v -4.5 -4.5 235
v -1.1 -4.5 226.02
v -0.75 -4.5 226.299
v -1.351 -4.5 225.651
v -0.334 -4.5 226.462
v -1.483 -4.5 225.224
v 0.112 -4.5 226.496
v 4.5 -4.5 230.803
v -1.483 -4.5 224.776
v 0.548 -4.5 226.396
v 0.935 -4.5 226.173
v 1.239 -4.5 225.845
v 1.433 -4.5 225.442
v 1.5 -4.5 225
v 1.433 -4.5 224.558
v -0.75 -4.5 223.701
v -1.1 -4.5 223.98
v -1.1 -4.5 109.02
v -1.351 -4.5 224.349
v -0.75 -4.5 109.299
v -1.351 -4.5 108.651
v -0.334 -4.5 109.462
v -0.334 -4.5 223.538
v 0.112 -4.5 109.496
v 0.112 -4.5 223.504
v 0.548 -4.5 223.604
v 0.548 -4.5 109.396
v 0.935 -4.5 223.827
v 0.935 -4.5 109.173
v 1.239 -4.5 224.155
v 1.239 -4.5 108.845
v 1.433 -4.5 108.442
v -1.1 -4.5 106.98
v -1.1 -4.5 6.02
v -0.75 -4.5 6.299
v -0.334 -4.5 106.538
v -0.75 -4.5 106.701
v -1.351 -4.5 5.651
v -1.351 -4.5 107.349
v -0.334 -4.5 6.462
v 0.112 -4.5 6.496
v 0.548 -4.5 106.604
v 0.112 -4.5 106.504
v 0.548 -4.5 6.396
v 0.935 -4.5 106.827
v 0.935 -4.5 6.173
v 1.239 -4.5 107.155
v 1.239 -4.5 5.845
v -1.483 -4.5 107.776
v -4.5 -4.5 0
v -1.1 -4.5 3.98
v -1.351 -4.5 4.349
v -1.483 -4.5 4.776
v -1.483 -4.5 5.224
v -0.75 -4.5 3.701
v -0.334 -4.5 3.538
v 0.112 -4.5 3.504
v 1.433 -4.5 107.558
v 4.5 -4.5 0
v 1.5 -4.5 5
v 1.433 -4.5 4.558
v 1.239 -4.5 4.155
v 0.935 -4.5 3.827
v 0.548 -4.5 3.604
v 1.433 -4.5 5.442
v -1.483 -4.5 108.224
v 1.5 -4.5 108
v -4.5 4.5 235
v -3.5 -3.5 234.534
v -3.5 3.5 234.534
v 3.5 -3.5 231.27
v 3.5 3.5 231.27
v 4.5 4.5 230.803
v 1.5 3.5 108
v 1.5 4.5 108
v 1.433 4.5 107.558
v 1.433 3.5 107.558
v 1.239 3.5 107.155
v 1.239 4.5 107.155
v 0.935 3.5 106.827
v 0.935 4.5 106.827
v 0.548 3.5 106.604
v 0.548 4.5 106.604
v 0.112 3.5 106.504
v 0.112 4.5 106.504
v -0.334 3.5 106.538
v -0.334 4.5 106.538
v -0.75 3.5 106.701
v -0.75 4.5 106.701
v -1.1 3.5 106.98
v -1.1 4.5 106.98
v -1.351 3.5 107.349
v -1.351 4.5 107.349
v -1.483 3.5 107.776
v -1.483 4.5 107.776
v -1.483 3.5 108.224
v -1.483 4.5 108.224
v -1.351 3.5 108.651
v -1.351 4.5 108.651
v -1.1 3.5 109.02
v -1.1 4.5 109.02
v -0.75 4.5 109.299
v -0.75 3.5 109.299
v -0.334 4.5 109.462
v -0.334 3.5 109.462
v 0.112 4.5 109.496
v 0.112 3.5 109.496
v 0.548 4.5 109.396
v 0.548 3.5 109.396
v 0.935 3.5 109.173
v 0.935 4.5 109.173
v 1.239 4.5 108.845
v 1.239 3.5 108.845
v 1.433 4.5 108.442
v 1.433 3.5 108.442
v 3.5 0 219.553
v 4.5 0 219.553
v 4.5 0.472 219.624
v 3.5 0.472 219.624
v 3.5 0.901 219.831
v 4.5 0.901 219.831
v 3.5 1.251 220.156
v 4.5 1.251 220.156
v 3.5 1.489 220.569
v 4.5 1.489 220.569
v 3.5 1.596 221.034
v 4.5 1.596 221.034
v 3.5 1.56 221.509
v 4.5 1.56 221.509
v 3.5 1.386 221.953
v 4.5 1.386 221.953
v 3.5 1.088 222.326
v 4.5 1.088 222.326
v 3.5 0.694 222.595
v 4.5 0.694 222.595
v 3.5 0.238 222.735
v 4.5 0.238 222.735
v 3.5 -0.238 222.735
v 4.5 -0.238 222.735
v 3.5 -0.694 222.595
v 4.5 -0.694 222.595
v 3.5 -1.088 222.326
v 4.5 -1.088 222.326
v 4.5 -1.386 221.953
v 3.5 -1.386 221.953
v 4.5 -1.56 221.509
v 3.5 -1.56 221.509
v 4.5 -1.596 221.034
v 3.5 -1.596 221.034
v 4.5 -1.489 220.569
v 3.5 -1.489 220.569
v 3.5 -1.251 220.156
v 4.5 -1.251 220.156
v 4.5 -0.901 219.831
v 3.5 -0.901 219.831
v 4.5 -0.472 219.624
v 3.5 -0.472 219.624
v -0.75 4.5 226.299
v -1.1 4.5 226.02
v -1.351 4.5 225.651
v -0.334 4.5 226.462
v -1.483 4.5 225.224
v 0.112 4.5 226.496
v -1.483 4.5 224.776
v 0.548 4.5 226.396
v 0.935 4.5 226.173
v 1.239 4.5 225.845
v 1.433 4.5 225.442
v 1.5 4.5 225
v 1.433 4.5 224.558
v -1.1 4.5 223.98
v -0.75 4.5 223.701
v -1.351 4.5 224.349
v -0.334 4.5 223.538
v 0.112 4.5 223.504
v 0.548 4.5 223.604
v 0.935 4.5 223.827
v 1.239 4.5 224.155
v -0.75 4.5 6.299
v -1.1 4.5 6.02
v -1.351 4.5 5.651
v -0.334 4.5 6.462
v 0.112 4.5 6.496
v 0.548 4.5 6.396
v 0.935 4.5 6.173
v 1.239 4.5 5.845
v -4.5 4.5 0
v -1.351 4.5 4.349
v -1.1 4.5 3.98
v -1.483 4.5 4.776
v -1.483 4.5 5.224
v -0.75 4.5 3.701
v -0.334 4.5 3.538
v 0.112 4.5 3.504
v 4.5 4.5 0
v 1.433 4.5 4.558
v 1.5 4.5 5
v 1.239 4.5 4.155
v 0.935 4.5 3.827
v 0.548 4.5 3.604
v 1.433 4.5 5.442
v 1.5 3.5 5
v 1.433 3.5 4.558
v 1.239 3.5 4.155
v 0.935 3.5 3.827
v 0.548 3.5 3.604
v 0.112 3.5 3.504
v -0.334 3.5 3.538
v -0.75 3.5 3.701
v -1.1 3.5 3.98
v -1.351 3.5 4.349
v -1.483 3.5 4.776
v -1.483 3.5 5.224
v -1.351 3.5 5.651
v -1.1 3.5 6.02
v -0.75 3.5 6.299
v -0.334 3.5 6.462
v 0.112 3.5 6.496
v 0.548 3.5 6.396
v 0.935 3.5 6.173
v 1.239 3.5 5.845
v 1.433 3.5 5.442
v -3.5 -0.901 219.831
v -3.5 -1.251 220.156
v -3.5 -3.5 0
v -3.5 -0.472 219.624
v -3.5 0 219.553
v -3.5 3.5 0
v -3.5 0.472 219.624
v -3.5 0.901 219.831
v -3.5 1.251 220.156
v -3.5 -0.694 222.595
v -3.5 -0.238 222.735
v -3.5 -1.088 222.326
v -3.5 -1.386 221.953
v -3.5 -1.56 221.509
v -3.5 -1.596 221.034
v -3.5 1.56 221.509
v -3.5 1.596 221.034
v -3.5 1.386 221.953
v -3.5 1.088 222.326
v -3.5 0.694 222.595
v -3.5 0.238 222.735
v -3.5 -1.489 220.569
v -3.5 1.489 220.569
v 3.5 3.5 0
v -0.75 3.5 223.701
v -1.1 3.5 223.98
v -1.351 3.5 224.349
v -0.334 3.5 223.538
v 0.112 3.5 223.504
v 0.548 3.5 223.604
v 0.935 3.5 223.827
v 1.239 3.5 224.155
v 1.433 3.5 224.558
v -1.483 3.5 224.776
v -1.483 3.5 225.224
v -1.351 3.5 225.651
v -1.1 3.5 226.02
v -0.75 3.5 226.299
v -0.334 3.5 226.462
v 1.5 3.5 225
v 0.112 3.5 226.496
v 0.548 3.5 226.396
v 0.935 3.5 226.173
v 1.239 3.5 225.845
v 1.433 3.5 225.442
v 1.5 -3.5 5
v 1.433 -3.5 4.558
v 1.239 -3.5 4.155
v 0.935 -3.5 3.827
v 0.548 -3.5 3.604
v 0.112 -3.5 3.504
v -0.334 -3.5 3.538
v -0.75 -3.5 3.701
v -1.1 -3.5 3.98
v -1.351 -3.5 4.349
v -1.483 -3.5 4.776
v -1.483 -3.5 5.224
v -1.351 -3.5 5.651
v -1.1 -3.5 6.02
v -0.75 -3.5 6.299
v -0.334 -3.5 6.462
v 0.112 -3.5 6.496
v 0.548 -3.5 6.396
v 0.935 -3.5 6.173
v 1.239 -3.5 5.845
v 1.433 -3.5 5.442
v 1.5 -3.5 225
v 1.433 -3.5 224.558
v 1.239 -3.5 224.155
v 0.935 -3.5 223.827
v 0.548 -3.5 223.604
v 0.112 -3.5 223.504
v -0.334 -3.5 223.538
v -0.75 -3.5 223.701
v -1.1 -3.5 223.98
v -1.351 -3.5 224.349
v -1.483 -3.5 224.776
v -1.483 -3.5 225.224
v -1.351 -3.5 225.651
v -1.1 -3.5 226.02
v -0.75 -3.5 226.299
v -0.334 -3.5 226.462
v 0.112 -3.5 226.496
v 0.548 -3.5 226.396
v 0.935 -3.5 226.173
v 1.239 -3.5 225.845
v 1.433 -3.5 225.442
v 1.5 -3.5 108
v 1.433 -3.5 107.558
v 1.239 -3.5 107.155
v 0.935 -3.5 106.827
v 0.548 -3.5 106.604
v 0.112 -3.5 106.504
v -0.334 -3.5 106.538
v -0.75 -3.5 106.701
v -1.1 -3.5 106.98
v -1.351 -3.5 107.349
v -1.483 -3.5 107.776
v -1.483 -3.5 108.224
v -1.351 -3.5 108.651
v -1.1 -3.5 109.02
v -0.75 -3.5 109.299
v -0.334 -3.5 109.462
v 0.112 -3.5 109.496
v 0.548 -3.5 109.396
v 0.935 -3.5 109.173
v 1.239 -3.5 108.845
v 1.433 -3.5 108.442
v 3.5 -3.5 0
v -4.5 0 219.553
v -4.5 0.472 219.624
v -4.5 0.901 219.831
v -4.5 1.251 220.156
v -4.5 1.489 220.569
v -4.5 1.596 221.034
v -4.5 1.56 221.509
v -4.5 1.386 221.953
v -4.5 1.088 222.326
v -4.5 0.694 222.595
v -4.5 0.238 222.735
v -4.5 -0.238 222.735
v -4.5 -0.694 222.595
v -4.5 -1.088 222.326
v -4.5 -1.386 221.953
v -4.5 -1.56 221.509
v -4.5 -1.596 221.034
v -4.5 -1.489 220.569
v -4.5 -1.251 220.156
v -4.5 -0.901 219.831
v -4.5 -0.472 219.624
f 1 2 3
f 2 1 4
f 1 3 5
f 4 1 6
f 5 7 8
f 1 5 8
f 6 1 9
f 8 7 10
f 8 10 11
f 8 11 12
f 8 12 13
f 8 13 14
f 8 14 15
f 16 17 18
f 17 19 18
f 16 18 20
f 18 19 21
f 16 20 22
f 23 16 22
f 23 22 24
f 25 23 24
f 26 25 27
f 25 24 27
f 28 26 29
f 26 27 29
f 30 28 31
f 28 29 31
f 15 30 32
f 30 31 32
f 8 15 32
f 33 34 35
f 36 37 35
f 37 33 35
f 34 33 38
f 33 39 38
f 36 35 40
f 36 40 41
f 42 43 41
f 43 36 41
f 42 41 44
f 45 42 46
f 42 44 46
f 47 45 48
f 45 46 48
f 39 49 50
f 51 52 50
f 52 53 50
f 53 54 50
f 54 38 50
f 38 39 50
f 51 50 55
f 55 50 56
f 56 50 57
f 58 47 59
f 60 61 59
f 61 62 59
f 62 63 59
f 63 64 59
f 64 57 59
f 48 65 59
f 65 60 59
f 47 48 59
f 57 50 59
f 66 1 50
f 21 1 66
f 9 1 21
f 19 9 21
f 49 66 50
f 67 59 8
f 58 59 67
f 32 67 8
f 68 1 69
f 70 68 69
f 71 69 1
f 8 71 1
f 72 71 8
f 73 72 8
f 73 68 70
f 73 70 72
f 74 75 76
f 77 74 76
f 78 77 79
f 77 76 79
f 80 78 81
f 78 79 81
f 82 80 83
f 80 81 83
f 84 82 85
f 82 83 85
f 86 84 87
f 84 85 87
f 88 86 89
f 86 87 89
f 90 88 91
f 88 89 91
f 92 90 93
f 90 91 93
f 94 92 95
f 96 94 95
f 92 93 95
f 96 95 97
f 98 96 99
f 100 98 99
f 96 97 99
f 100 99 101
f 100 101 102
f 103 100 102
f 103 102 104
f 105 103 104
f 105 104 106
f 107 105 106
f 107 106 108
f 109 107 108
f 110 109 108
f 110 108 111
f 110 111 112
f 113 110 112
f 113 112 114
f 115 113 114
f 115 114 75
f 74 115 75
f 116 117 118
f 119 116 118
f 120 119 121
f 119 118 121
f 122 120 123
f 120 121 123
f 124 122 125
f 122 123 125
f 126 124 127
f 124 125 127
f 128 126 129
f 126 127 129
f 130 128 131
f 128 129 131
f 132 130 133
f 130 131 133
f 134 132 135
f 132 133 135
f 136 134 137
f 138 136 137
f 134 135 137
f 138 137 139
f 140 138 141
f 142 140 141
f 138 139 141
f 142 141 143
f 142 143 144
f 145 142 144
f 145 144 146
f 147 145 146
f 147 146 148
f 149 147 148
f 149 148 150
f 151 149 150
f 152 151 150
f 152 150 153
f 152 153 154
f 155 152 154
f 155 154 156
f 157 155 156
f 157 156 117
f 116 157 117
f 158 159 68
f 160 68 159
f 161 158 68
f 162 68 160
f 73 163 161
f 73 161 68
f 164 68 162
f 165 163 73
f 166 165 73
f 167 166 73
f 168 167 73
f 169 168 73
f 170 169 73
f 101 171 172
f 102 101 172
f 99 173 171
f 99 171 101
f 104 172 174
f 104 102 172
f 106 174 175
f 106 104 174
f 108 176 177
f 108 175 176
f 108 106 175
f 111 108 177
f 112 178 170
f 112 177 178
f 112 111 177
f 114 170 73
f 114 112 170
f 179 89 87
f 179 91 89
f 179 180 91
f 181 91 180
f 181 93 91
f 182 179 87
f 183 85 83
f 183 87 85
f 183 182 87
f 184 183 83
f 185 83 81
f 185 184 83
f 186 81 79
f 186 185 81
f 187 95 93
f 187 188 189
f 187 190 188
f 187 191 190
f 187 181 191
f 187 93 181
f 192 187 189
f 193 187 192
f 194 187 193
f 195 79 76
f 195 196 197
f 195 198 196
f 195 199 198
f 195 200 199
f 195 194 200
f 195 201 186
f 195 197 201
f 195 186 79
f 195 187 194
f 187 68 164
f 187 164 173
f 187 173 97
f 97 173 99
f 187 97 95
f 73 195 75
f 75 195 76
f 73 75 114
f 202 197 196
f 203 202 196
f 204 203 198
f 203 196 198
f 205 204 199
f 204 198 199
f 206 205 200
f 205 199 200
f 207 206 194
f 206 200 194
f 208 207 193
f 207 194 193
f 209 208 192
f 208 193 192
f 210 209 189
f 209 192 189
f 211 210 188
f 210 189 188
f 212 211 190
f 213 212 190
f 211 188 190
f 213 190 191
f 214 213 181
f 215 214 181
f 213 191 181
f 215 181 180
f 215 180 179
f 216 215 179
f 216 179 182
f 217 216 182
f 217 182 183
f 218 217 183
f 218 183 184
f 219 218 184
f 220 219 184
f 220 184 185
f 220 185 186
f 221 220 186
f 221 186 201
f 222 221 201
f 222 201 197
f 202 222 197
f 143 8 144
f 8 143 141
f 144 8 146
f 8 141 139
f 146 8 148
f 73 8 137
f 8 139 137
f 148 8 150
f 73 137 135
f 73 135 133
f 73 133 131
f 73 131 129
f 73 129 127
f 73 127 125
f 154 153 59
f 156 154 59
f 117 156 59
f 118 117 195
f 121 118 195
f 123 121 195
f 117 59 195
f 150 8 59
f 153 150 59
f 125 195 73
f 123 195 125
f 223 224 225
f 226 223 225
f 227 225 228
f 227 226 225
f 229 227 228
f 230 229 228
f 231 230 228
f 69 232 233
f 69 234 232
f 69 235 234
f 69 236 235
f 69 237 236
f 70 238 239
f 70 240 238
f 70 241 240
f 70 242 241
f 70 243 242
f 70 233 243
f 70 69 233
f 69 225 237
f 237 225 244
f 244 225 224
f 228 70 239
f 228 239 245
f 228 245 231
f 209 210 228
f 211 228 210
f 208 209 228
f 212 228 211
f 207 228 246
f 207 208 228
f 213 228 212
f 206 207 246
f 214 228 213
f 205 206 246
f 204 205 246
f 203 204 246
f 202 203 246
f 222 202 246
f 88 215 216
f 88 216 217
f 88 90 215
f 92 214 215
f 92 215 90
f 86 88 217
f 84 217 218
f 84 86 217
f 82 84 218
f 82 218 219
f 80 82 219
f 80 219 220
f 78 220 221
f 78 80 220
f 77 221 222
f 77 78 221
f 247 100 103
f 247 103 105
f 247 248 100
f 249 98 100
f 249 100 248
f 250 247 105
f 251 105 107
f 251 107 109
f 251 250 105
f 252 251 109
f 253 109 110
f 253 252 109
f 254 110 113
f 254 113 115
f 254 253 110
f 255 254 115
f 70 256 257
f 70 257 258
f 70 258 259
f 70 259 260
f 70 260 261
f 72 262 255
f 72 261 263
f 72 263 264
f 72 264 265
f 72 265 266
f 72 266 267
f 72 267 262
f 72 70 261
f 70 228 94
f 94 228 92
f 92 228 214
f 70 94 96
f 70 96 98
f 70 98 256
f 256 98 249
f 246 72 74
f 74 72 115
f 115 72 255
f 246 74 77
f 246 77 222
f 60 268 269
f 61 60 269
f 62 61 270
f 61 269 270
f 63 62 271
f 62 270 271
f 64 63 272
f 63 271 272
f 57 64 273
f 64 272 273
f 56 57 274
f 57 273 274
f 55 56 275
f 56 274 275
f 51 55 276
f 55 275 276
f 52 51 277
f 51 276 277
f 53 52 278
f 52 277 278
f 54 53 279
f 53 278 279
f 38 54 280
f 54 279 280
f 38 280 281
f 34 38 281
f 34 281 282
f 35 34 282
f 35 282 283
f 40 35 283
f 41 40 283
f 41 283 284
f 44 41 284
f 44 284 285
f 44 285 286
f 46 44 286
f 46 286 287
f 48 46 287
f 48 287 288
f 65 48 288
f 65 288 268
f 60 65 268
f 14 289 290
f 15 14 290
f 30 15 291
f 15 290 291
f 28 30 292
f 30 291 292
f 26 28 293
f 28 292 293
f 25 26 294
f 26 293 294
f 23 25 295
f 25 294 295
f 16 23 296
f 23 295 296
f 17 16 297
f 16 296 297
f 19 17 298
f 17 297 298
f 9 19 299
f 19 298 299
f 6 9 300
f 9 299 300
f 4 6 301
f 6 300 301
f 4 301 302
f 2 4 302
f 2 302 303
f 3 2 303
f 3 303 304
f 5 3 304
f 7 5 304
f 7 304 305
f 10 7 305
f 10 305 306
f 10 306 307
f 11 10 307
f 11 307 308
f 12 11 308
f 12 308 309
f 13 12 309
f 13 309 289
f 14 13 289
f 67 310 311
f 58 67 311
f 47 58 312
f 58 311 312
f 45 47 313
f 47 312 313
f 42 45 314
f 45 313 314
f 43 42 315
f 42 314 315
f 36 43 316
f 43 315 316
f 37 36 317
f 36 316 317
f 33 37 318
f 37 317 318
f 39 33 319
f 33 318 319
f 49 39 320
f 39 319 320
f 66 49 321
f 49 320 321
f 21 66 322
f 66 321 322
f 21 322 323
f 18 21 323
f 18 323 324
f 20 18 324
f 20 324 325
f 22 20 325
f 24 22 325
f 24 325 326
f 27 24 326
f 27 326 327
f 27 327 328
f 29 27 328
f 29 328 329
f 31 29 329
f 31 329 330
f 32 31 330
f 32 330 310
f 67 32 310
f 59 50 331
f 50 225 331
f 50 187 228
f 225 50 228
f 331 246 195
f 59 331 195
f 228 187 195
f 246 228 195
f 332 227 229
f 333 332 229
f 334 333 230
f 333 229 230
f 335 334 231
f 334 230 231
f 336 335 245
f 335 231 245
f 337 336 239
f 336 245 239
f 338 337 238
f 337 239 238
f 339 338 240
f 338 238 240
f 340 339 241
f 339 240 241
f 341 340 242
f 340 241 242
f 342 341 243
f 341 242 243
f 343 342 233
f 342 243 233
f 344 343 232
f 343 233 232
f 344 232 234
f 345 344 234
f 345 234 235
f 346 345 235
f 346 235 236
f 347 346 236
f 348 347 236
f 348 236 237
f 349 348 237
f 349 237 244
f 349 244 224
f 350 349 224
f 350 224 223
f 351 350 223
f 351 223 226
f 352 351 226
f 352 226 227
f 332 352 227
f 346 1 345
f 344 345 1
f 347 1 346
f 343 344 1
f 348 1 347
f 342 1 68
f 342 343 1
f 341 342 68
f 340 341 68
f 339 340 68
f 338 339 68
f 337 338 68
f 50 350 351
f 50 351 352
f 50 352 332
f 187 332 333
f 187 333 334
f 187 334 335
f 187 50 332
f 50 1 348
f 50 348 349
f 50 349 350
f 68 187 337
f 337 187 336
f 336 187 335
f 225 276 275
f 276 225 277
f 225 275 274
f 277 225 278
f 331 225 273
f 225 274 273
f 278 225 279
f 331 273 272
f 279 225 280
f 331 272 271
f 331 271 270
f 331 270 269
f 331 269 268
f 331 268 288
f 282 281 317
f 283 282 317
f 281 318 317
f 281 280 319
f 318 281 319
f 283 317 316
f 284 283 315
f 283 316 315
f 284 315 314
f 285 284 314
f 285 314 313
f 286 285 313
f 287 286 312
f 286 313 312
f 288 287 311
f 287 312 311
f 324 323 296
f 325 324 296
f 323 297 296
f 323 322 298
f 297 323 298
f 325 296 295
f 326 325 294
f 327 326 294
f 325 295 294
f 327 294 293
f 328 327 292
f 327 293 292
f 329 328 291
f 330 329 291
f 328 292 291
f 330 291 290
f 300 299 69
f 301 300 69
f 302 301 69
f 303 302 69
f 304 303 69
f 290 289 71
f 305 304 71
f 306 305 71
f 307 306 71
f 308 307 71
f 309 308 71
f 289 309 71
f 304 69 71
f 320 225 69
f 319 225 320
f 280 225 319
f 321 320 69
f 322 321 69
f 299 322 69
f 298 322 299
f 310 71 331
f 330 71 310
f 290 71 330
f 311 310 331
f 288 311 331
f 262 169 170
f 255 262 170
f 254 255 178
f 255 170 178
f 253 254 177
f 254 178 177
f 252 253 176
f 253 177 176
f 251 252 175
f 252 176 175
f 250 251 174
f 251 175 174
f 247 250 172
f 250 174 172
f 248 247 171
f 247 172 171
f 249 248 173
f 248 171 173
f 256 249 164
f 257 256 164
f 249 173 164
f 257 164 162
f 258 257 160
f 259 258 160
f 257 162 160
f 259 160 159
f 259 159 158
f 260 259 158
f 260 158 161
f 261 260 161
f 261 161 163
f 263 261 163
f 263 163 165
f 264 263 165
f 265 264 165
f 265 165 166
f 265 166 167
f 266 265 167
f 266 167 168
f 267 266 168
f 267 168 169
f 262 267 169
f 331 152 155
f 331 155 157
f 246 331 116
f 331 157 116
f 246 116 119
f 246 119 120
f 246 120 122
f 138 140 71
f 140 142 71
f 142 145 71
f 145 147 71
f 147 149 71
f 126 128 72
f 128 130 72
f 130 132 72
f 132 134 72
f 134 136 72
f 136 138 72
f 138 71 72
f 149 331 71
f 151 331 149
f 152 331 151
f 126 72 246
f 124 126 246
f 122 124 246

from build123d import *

# Parameters (mm, degrees)
SKETCH_1_W          = 9
SKETCH_1_H          = 9
EXTRUDE_1_DEPTH     = 235
SKETCH_2_W          = 7
SKETCH_2_H          = 7
CUT_EXTRUDE_1_DEPTH = 235
SKETCH_3_R          = 1.5
CUT_EXTRUDE_2_DEPTH = 235
CUT_EXTRUDE_3_DEPTH = 235
SKETCH_5_R          = 1.6
CUT_EXTRUDE_4_DEPTH = 10


with BuildPart() as part:
    # ｽｹｯﾁ1 → ﾎﾞｽ - 押し出し1 (new body)
    with BuildSketch(Plane.XY):
        Rectangle(SKETCH_1_W, SKETCH_1_H)
    extrude(amount=EXTRUDE_1_DEPTH)

    # ｽｹｯﾁ2 → ｶｯﾄ - 押し出し1 (cut)
    with BuildSketch(Plane.XY.offset(235)):
        Rectangle(SKETCH_2_W, SKETCH_2_H)
    extrude(amount=-CUT_EXTRUDE_1_DEPTH, mode=Mode.SUBTRACT)

    # ｽｹｯﾁ3 → ｶｯﾄ - 押し出し2 (cut)
    with BuildSketch(Plane(origin=(0, 4.5, 0), x_dir=(1, 0, 0), z_dir=(0, 1, 0))):
        with Locations((0, -5)):
            Circle(SKETCH_3_R)
        with Locations((0, -108)):
            Circle(SKETCH_3_R)
        with Locations((0, -225)):
            Circle(SKETCH_3_R)
    extrude(amount=-CUT_EXTRUDE_2_DEPTH, mode=Mode.SUBTRACT)

    # ｽｹｯﾁ4 → ｶｯﾄ - 押し出し3 (cut)
    with BuildSketch(Plane(origin=(0, 4.5, 0), x_dir=(1, 0, 0), z_dir=(0, 1, 0))):
        Polygon((4.5, -235), (-4.5, -235), (5.898758527, -230.150979263), align=None)
    extrude(amount=-CUT_EXTRUDE_3_DEPTH, mode=Mode.SUBTRACT)

    # ｽｹｯﾁ5 → ｶｯﾄ - 押し出し4 (cut)
    with BuildSketch(Plane(origin=(4.5, 0, 0), x_dir=(0, 0, -1), z_dir=(1, 0, 0))):
        with Locations((-221.153231077, 0)):
            Circle(SKETCH_5_R)
    extrude(amount=-CUT_EXTRUDE_4_DEPTH, mode=Mode.SUBTRACT)


solid = part.part
